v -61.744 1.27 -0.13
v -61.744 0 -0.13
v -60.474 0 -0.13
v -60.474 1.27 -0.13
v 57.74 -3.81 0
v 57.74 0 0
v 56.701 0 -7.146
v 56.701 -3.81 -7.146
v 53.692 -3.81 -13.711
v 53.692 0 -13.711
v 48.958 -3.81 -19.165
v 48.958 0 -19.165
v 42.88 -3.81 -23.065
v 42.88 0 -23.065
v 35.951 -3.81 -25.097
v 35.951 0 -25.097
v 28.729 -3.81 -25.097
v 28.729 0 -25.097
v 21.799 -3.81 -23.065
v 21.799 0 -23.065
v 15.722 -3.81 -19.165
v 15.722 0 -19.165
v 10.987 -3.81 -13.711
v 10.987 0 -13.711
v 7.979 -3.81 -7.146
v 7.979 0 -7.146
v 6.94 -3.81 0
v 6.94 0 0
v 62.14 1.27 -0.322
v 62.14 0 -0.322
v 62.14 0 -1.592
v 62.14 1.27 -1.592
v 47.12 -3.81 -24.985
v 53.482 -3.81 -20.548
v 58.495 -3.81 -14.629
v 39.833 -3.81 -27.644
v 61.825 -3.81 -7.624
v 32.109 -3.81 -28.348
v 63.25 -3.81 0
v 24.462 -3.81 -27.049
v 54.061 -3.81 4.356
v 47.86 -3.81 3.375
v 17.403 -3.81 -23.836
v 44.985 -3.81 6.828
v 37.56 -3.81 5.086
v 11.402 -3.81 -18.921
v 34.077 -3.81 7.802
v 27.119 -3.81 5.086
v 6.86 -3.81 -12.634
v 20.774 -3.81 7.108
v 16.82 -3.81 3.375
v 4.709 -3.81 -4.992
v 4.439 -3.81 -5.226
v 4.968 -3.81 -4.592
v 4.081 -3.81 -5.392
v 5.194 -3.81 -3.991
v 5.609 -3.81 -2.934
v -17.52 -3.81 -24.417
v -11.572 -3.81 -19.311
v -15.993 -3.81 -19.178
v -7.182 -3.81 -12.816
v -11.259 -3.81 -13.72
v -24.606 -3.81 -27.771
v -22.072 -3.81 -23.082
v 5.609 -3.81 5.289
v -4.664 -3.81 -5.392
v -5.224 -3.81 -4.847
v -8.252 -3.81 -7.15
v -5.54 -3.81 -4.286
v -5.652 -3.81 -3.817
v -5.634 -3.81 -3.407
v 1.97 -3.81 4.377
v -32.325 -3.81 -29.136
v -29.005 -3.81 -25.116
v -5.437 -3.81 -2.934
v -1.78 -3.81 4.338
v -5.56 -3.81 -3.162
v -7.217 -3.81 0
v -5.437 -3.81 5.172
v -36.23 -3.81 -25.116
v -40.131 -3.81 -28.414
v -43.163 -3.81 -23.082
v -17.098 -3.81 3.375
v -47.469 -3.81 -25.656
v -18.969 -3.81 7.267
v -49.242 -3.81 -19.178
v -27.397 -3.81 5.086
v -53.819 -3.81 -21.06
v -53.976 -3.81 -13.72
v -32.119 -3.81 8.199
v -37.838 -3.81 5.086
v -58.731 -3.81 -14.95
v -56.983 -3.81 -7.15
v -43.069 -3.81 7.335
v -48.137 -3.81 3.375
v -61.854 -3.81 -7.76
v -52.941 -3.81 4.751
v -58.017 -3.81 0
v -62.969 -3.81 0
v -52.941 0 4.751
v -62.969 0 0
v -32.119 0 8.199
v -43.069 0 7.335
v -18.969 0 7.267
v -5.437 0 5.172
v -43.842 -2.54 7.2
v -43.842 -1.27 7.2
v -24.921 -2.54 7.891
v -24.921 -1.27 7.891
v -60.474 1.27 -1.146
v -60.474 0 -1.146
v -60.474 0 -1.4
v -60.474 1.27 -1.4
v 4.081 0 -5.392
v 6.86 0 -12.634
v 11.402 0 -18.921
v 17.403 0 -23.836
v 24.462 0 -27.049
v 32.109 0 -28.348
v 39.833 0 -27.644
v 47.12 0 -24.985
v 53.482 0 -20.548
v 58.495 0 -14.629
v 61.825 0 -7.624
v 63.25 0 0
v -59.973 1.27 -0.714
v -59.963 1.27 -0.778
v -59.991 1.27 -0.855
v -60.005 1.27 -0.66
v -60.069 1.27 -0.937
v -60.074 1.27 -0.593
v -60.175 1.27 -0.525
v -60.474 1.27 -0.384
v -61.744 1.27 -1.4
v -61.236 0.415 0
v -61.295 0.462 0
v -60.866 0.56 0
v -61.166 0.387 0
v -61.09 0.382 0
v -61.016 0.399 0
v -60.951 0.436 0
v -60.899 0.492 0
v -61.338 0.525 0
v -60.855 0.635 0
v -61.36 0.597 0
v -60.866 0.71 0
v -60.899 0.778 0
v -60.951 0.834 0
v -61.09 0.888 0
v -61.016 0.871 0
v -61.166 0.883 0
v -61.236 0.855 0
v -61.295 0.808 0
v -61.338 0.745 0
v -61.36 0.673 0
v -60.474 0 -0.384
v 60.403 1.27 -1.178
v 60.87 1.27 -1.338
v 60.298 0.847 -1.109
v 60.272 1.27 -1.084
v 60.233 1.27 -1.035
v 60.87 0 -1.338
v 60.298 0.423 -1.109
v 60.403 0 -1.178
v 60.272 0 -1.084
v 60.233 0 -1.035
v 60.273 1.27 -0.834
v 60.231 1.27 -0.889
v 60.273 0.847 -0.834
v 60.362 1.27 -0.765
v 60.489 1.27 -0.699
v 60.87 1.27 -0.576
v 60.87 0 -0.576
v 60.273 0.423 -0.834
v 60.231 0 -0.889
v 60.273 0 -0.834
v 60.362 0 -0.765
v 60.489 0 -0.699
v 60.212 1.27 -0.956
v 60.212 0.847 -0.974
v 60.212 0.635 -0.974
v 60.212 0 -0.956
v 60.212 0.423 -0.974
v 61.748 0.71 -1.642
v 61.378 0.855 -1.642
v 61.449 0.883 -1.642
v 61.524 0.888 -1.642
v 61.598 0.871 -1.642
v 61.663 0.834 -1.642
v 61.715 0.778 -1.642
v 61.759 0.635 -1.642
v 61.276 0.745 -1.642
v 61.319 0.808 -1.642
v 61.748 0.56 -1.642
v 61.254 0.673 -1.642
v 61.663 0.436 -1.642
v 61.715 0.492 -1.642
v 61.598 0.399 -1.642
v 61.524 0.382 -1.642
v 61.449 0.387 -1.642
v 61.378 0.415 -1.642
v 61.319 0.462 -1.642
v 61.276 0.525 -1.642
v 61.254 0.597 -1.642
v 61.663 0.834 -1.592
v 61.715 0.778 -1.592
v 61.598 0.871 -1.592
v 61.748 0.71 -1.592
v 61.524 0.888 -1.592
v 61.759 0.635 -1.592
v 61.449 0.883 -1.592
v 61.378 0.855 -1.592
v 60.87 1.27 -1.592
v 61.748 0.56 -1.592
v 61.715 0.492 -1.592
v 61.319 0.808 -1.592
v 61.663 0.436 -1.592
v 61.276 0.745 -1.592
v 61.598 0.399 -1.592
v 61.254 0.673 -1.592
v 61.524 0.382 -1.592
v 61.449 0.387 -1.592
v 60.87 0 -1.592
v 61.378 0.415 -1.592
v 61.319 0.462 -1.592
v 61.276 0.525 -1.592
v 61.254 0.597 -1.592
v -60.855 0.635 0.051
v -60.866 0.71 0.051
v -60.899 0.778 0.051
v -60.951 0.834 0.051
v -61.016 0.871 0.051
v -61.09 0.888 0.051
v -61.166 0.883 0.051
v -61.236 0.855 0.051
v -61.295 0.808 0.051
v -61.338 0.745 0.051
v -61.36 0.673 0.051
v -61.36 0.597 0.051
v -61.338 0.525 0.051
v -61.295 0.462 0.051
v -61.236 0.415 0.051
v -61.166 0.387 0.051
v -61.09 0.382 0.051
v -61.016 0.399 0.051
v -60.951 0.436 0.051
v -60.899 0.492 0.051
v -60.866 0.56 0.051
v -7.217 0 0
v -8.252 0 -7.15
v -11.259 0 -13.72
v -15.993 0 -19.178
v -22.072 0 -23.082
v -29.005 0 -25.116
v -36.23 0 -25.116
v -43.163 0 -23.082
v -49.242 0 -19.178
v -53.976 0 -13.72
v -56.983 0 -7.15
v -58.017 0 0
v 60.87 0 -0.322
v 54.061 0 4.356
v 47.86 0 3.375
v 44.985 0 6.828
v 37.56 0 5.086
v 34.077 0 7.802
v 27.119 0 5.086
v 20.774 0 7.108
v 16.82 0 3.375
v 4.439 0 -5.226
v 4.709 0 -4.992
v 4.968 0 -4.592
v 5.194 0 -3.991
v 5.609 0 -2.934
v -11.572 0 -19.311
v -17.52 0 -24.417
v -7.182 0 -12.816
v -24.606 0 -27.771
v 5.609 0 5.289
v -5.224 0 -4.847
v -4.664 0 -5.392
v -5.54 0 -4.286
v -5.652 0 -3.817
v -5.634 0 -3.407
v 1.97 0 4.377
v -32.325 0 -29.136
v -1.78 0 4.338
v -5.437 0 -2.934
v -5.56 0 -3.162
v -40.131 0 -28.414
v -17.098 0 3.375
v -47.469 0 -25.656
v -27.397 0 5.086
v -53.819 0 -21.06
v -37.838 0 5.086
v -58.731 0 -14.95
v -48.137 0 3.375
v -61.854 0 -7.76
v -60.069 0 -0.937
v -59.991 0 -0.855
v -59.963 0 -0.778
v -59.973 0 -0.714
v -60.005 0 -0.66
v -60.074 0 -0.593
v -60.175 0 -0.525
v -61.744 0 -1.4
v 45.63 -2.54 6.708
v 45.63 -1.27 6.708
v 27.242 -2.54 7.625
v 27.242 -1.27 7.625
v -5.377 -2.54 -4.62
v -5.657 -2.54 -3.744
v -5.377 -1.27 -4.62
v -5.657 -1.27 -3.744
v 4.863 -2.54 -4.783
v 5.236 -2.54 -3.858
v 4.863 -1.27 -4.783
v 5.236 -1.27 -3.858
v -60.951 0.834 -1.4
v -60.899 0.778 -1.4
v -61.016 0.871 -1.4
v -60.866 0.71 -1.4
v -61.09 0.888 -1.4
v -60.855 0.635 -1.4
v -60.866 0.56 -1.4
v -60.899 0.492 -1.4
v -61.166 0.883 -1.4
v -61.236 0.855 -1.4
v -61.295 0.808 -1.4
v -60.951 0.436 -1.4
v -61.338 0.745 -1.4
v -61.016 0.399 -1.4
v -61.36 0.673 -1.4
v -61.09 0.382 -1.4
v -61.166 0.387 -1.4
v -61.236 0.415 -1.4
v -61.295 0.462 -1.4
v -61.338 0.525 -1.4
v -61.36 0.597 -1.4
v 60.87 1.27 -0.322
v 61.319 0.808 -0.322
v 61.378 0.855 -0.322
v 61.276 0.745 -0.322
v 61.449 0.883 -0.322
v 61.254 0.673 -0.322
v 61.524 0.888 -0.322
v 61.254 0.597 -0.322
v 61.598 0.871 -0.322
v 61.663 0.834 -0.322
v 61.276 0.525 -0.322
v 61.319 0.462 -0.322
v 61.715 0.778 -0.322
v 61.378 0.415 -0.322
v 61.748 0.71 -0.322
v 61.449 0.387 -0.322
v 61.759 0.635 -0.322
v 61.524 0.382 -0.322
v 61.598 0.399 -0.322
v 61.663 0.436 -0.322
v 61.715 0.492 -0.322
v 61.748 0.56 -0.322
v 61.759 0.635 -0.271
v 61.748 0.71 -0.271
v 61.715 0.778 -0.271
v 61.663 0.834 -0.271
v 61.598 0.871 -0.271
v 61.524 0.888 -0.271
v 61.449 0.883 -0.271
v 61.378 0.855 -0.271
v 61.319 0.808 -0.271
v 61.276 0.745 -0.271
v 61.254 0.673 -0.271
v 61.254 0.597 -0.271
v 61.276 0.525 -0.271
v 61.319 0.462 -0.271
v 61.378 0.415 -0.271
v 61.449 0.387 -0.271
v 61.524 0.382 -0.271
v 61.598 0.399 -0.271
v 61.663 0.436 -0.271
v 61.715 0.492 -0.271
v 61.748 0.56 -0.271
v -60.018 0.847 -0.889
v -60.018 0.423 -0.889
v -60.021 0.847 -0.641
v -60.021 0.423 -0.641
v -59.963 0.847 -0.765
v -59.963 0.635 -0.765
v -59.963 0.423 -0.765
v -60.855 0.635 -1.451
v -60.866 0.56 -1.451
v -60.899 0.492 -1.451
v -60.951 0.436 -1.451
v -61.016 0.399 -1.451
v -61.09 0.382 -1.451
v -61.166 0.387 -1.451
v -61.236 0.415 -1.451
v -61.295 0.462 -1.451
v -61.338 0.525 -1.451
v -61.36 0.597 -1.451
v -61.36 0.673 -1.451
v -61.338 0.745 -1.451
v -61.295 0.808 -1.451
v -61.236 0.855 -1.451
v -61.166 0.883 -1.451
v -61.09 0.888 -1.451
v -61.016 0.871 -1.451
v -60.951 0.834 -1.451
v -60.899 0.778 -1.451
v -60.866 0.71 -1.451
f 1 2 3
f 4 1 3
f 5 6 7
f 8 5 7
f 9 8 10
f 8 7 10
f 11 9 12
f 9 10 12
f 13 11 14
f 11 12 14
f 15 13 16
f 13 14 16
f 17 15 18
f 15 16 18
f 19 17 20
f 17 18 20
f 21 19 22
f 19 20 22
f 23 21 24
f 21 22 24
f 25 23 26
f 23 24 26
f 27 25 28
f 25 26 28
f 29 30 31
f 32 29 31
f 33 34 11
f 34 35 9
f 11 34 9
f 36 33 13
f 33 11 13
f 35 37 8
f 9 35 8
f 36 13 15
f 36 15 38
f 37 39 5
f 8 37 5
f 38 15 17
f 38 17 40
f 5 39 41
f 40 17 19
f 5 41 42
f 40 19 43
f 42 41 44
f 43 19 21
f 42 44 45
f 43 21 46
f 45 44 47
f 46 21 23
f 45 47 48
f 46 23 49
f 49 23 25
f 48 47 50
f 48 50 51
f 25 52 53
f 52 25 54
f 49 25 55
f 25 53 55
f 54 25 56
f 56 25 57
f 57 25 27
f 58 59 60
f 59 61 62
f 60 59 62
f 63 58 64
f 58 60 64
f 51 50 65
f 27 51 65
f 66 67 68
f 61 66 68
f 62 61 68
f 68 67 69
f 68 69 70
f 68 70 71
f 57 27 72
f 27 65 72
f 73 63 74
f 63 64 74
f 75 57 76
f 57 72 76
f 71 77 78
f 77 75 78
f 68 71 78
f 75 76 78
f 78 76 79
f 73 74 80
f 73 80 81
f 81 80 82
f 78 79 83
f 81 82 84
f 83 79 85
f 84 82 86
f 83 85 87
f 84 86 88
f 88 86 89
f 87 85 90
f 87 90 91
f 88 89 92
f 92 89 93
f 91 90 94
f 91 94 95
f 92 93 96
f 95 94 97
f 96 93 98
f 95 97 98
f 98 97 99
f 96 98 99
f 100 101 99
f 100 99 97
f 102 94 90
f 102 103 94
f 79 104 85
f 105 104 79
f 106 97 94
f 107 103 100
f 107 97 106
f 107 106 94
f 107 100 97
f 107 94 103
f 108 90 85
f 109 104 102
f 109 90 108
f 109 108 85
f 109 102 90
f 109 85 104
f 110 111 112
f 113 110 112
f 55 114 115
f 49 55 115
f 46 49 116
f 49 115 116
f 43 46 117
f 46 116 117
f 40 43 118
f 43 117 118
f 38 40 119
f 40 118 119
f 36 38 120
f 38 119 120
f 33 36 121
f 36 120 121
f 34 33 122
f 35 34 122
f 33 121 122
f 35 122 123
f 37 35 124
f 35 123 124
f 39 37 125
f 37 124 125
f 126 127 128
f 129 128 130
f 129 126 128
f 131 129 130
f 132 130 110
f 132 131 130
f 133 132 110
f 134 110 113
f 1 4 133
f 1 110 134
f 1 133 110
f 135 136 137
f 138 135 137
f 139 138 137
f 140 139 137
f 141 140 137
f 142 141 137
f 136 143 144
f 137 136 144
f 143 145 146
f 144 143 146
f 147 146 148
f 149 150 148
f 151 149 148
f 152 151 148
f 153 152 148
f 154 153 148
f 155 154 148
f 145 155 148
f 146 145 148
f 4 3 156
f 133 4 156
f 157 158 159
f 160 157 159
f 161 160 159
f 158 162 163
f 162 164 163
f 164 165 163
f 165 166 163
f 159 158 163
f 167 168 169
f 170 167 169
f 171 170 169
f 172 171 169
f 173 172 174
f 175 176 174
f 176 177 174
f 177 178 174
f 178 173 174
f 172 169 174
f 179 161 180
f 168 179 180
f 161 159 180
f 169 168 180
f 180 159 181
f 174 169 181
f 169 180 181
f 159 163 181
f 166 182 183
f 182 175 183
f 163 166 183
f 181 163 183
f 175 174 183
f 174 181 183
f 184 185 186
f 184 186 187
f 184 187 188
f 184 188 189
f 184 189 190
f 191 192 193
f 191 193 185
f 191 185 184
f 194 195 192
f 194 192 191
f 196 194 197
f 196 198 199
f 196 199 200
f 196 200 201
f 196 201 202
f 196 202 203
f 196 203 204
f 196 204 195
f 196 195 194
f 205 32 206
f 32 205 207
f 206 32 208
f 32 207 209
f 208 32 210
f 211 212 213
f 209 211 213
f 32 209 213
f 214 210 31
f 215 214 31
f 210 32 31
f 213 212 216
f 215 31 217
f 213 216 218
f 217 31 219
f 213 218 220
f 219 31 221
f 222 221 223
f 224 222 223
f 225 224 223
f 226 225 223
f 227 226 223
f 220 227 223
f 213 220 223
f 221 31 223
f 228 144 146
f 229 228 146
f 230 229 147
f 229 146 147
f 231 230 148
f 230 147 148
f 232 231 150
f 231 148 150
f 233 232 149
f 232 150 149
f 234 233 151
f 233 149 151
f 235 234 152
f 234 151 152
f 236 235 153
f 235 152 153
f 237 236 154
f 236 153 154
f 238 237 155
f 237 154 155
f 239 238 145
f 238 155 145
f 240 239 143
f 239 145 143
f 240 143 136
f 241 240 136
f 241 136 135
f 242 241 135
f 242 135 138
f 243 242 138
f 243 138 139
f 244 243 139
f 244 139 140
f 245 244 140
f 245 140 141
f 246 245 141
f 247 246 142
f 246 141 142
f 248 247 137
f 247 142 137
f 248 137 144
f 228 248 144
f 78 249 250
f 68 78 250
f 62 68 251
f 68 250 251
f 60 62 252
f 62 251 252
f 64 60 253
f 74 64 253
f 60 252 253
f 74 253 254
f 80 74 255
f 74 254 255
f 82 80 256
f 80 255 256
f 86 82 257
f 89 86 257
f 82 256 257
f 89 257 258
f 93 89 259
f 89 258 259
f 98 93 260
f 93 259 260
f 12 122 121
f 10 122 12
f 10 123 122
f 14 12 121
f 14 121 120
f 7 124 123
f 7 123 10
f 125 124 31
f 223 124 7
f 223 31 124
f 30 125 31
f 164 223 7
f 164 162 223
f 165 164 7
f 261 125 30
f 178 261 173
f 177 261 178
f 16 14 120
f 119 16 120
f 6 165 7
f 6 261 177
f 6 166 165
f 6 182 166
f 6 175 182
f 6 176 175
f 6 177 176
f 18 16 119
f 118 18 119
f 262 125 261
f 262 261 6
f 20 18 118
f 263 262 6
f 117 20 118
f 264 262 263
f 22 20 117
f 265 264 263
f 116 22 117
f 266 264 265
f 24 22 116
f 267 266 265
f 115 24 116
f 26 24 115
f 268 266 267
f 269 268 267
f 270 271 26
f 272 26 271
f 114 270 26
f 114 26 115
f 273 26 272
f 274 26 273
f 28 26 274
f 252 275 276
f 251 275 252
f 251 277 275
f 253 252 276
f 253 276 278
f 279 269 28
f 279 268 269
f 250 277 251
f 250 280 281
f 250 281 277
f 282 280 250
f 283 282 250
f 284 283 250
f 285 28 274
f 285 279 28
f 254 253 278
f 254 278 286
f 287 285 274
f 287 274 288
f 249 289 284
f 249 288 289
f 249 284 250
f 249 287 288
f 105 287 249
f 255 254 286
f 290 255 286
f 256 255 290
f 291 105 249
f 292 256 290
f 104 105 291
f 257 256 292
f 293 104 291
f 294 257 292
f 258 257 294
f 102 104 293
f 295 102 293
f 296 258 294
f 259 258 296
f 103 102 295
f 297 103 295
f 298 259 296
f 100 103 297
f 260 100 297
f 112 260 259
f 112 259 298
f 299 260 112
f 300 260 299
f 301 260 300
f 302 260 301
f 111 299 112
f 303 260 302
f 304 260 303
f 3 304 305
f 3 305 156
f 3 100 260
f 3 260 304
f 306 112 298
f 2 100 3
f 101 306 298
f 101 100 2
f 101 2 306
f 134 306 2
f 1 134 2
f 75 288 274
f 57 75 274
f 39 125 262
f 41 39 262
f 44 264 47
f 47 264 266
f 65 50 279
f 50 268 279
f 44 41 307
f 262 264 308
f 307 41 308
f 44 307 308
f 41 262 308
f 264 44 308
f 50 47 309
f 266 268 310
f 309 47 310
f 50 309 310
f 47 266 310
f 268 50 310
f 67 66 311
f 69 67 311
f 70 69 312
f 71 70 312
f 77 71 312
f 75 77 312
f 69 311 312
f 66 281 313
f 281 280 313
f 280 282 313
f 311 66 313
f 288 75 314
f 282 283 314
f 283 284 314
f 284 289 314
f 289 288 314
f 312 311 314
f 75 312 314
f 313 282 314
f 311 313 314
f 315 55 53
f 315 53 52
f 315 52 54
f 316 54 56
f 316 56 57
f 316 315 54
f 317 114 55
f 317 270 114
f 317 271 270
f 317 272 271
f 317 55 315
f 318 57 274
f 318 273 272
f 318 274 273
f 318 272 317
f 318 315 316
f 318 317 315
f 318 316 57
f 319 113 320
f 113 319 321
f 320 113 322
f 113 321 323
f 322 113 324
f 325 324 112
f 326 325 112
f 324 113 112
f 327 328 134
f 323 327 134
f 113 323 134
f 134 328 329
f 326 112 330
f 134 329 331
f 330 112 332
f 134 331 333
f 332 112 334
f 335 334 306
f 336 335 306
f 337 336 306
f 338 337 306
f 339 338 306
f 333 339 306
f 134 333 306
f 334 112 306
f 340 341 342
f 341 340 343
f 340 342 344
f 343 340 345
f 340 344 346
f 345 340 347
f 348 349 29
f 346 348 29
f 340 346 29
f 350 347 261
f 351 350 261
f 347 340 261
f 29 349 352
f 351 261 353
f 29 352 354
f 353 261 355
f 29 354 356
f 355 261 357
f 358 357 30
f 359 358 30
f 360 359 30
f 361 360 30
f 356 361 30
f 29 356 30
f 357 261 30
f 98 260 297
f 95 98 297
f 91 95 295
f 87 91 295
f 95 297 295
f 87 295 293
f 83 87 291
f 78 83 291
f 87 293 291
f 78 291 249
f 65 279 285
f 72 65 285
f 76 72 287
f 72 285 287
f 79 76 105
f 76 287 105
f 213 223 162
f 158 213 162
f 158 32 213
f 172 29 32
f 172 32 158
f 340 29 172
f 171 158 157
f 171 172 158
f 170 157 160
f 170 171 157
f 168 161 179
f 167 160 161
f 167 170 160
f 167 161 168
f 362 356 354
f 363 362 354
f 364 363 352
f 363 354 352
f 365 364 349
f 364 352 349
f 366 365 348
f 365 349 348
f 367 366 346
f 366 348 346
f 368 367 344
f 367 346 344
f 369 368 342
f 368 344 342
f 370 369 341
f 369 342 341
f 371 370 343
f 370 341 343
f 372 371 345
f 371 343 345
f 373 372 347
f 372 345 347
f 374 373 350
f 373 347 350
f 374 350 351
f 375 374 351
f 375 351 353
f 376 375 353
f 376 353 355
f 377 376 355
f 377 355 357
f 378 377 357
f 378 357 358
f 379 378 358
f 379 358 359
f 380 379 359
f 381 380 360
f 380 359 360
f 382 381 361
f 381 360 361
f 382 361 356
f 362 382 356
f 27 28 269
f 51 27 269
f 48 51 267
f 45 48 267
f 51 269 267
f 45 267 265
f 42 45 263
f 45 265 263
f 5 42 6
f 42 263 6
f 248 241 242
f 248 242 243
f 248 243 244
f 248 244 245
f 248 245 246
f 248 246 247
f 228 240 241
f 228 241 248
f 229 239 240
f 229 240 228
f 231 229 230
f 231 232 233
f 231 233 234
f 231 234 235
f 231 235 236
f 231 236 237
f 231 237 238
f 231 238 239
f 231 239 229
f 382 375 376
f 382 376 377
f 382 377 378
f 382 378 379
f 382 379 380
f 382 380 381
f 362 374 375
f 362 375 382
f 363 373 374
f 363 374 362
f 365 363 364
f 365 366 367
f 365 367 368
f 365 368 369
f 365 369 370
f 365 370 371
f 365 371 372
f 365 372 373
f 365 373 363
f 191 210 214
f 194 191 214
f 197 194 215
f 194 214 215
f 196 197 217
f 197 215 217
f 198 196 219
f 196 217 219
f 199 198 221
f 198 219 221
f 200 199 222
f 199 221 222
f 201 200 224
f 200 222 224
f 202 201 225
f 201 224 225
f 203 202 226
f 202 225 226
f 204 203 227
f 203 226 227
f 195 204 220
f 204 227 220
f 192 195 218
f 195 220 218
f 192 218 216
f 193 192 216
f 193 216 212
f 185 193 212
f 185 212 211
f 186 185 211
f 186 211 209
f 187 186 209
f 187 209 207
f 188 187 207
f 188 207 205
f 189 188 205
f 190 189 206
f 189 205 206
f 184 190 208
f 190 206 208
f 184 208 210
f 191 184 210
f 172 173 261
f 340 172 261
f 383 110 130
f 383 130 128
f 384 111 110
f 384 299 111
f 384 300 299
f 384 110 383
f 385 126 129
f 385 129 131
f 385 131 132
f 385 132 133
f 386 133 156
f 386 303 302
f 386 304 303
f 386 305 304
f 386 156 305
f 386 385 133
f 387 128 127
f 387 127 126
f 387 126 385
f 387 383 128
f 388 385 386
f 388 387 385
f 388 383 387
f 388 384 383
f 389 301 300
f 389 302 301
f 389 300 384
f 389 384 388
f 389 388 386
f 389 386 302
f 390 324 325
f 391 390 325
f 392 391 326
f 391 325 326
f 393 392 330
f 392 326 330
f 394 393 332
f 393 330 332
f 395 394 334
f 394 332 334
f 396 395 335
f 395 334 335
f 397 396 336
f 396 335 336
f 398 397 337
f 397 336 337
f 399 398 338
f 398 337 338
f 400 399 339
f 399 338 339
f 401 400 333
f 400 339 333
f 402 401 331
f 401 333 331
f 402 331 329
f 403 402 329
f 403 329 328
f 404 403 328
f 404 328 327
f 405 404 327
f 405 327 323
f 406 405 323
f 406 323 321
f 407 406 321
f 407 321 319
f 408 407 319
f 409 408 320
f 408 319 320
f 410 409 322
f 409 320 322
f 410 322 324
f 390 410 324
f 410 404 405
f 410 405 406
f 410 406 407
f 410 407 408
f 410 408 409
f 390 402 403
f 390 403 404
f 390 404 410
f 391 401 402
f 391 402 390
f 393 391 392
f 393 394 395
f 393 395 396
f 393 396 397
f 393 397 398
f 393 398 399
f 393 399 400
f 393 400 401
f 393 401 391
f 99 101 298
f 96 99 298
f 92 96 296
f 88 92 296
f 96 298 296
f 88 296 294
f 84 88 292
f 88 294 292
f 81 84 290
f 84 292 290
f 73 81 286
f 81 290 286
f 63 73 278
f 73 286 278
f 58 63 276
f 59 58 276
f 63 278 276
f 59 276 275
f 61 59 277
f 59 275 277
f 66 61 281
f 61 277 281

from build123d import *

# Parameters (mm, degrees)
F1_DEPTH  = 3.81
F3_DEPTH  = 1.27
F4_R      = 0.254
F5_DEPTH  = 0.0508
F6_R      = 0.254
F7_DEPTH  = 0.0508
F10_DEPTH = 1.27
F11_R     = 0.254
F12_DEPTH = 0.0508
F13_R     = 0.254
F14_DEPTH = 0.0508


with BuildPart() as f1:
    # F0 (on Front) → F1 (new body)
    with BuildSketch(Plane.XZ):
        with BuildLine():
            add(Edge.make_bspline(
                [(-62.9689469934, 0), (-43.4820093215, 11.4878732711), (-25.4599396139, 8.5638780147), (-5.4366267286, 5.1720426418)],
                knots=[0, 0, 0, 0, 57.7643306906, 57.7643306906, 57.7643306906, 57.7643306906], degree=3))
            ThreePointArc((-62.9689469934, 0), (-36.2522522442, -29.0356523147), (-4.66360664, -5.3922948427))
            add(Edge.make_bspline(
                [(-4.66360664, -5.3922948427), (-5.5713243783, -4.7302497551), (-5.9305182658, -3.6526678596), (-5.4366267286, -2.9342800844)],
                knots=[0, 0, 0, 0, 2.5767026622, 2.5767026622, 2.5767026622, 2.5767026622], degree=3))
            Line((-5.4366267286, -2.9342800844), (5.6085870601, -2.9342800844))
            add(Edge.make_bspline(
                [(4.0806569159, -5.3922948427), (5.2044941112, -5.0445445813), (5.0992770121, -3.7536183372), (5.6085870601, -2.9342800844)],
                knots=[0, 0, 0, 0, 2.8942023215, 2.8942023215, 2.8942023215, 2.8942023215], degree=3))
            ThreePointArc((4.0806569159, -5.3922948427), (35.9938478734, -28.2460028311), (63.250169158, 0))
            add(Edge.make_bspline(
                [(63.250169158, 0), (45.1895557344, 10.4495026171), (29.6890791506, 8.4054833278), (5.6085870601, 5.289001856)],
                knots=[0, 0, 0, 0, 57.883724201, 57.883724201, 57.883724201, 57.883724201], degree=3))
            ThreePointArc((5.6085870601, 5.289001856), (0.0963910818, 4.247352223), (-5.4366267286, 5.1720426418))
        make_face()
        with BuildLine():
            ThreePointArc((-7.2174832575, 0), (-32.6174700341, -25.3740819308), (-58.0174568108, 0))
            ThreePointArc((-58.0174568108, 0), (-32.6174700341, 5.3012829029), (-7.2174832575, 0))
        make_face(mode=Mode.SUBTRACT)
        with BuildLine():
            ThreePointArc((57.7398084539, 0), (32.339848041, -25.3551555329), (6.9398876282, 0))
            ThreePointArc((6.9398876282, 0), (32.339848041, 5.3012713968), (57.7398084539, 0))
        make_face(mode=Mode.SUBTRACT)
    extrude(amount=F1_DEPTH)

    # F2 (on face) → F3 (join)
    with BuildSketch(Plane(origin=(0, 0, 0), x_dir=(-1, 0, 0), z_dir=(0, 1, 0))):
        with BuildLine():
            Line((61.7441900933, -1.4002811255), (61.7441900933, -0.1302811255))
            Line((61.7441900933, -0.1302811255), (60.4741896731, -0.1302811255))
            Line((60.4741896731, -0.1302811255), (60.4741896731, -0.3842811255))
            add(Edge.make_bspline(
                [(60.4741896731, -1.1462811255), (59.7843156037, -0.8797379018), (59.7999927893, -0.6508243202), (60.4741896731, -0.3842811255)],
                knots=[0, 0, 0, 0, 0.762, 0.762, 0.762, 0.762], degree=3))
            Line((60.4741896731, -1.1462811255), (60.4741896731, -1.4002811255))
            Line((60.4741896731, -1.4002811255), (61.7441900933, -1.4002811255))
        make_face()
    extrude(amount=F3_DEPTH)

    # F6 (on face) → F7 (join)
    with BuildSketch(Plane(origin=(0, 0, -1.4002811255), x_dir=(1, 0, 0), z_dir=(0, 0, -1))):
        with Locations((-61.1091896731, -0.635)):
            Circle(F6_R)
    extrude(amount=F7_DEPTH)

    # F9 (on face) → F10 (join)
    with BuildSketch(Plane(origin=(0, 0, 0), x_dir=(-1, 0, 0), z_dir=(0, 1, 0))):
        with BuildLine():
            Line((-60.8700512755, -0.3216592674), (-62.1400512755, -0.3216592674))
            Line((-62.1400512755, -0.3216592674), (-62.1400512755, -1.5916592674))
            Line((-62.1400512755, -1.5916592674), (-60.8700512755, -1.5916592674))
            Line((-60.8700512755, -1.5916592674), (-60.8700512755, -1.3376592674))
            add(Edge.make_bspline(
                [(-60.8700512755, -1.3376592674), (-60.0512363017, -1.1532660574), (-59.9351897836, -0.8051300538), (-60.8700512755, -0.5756592674)],
                knots=[0, 0, 0, 0, 0.762, 0.762, 0.762, 0.762], degree=3))
            Line((-60.8700512755, -0.5756592674), (-60.8700512755, -0.3216592674))
        make_face()
    extrude(amount=F10_DEPTH)

    # F11 (on face) → F12 (join)
    with BuildSketch(Plane(origin=(0, 0, -1.5916592674), x_dir=(1, 0, 0), z_dir=(0, 0, -1))):
        with Locations((61.5050512755, -0.635)):
            Circle(F11_R)
    extrude(amount=F12_DEPTH)

    # F13 (on face) → F14 (join)
    with BuildSketch(Plane.XY.offset(-0.3216592674)):
        with Locations((61.5050512755, 0.635)):
            Circle(F13_R)
    extrude(amount=F14_DEPTH)


with BuildPart() as f5:
    # F4 (on Top) → F5 (new body)
    with BuildSketch(Plane.XY):
        with Locations((-61.1091896731, 0.635)):
            Circle(F4_R)
    extrude(amount=F5_DEPTH)


solid = Compound([f1.part, f5.part])
